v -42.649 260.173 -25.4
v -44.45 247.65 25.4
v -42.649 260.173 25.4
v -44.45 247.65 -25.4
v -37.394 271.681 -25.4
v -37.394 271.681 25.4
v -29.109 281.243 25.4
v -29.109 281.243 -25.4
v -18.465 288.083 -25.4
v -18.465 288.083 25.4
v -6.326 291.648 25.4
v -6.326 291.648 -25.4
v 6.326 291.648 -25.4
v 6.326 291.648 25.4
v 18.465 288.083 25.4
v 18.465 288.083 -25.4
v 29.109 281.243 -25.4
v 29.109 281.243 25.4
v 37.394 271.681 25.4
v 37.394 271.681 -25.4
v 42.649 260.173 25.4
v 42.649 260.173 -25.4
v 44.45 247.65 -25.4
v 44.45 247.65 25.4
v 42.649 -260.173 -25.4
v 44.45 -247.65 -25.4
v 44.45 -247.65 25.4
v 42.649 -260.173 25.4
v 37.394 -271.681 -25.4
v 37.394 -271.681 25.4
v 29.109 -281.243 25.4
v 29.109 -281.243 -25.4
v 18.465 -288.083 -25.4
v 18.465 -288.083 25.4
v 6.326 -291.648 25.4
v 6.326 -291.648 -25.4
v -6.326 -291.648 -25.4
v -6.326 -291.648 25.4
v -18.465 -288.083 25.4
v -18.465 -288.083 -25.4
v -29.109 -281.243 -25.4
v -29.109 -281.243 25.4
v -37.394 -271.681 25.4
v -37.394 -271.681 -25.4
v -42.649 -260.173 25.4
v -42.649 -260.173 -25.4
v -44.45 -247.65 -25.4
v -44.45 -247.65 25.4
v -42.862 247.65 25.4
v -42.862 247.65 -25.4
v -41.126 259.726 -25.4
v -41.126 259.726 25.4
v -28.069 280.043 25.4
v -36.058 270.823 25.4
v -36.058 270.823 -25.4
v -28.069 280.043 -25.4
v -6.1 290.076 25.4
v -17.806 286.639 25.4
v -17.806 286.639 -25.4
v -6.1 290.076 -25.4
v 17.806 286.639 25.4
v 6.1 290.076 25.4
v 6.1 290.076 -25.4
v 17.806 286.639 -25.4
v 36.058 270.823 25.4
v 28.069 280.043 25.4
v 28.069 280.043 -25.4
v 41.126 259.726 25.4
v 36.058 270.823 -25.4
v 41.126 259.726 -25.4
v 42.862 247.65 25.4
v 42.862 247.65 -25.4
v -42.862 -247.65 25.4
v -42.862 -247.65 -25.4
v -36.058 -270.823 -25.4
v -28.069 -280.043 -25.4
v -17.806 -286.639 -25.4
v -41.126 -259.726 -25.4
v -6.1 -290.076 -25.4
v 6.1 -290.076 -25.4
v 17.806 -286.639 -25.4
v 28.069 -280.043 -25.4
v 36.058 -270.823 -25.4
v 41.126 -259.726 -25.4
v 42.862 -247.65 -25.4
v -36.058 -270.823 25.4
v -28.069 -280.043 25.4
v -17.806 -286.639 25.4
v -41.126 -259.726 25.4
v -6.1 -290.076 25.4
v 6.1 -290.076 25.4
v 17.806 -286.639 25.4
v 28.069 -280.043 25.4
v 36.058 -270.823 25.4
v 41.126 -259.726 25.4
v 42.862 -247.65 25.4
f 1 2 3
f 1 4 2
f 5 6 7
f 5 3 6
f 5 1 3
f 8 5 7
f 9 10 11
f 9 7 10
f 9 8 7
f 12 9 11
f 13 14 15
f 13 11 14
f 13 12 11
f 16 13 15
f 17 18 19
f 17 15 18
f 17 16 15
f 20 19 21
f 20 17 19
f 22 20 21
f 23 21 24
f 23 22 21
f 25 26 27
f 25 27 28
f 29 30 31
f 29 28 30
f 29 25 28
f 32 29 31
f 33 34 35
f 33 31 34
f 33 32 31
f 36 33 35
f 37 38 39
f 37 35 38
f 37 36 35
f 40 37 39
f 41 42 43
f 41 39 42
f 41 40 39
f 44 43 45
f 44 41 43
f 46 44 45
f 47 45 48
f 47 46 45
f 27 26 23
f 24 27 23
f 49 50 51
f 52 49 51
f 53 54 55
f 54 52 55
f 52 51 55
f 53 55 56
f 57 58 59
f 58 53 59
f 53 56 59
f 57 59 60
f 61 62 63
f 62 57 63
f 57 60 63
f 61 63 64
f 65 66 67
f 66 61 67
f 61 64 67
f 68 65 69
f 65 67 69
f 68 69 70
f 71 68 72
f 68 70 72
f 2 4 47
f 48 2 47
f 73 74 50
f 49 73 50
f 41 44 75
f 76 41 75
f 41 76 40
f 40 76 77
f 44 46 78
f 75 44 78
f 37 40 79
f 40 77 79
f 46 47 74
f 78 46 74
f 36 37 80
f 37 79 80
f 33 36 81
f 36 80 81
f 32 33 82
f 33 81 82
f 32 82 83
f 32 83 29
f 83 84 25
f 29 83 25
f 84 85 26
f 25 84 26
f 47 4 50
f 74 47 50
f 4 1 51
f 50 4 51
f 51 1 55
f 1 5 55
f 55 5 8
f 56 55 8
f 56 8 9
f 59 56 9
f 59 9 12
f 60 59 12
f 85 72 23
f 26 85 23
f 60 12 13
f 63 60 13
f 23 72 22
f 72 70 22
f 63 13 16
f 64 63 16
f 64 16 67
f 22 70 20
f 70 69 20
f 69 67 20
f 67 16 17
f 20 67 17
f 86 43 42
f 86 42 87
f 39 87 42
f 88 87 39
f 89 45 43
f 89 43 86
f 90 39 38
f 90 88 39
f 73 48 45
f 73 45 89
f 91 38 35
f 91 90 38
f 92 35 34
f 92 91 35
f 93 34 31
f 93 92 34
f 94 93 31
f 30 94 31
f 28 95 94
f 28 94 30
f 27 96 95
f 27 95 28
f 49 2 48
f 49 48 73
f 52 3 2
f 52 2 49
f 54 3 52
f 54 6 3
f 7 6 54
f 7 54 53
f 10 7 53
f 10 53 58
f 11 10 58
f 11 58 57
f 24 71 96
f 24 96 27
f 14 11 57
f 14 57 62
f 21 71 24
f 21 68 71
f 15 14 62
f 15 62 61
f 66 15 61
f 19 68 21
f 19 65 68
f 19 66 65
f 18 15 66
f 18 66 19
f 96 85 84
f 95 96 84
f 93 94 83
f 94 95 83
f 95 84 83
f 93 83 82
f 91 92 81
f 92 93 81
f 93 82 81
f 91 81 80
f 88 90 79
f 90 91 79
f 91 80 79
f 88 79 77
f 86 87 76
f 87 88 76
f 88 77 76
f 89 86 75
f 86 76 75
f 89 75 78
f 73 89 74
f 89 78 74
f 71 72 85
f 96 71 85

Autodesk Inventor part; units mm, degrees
ref_plane "YZ Plane" through (0, 0, 0) normal (1, 0, 0) x (0, 1, 0)
ref_plane "XZ Plane" through (0, 0, 0) normal (0, 1, 0) x (-1, 0, 0)
ref_plane "XY Plane" through (0, 0, 0) normal (0, 0, 1) x (1, 0, 0)
sketch "Sketch1" plane through (0, 0, 0) normal (0, 0, 1) x (1, 0, 0)
  line L0 (0, 247.65) -> (0, -247.65) construction
  line L1 (-44.45, 247.65) -> (-44.45, -247.65)
  line L2 (44.45, -247.65) -> (44.45, 247.65)
  arc A0 (44.45, 247.65) -> (-44.45, 247.65) centre (0, 247.65) ccw
  arc A1 (-44.45, -247.65) -> (44.45, -247.65) centre (0, -247.65) ccw
  line L3 (-42.8625, -247.65) -> (-42.8625, 247.65)
  arc A2 (42.8625, 247.65) -> (-42.8625, 247.65) centre (0, 247.65) ccw
  line L4 (42.8625, 247.65) -> (42.8625, -247.65)
  arc A3 (-42.8625, -247.65) -> (42.8625, -247.65) centre (0, -247.65) ccw
  point P0 (0, 0)
  dimension "d0" = 495.3
  dimension "d1" = 44.45
  dimension "d2" = 1.5875
extrude "Extrusion1" add sketch "Sketch1" along normal mid plane 50.8
properties part number "1_16 Thick x 2 Wide Urethane Flat Belting (10 Long)(217-6002)" material "Rubber"
